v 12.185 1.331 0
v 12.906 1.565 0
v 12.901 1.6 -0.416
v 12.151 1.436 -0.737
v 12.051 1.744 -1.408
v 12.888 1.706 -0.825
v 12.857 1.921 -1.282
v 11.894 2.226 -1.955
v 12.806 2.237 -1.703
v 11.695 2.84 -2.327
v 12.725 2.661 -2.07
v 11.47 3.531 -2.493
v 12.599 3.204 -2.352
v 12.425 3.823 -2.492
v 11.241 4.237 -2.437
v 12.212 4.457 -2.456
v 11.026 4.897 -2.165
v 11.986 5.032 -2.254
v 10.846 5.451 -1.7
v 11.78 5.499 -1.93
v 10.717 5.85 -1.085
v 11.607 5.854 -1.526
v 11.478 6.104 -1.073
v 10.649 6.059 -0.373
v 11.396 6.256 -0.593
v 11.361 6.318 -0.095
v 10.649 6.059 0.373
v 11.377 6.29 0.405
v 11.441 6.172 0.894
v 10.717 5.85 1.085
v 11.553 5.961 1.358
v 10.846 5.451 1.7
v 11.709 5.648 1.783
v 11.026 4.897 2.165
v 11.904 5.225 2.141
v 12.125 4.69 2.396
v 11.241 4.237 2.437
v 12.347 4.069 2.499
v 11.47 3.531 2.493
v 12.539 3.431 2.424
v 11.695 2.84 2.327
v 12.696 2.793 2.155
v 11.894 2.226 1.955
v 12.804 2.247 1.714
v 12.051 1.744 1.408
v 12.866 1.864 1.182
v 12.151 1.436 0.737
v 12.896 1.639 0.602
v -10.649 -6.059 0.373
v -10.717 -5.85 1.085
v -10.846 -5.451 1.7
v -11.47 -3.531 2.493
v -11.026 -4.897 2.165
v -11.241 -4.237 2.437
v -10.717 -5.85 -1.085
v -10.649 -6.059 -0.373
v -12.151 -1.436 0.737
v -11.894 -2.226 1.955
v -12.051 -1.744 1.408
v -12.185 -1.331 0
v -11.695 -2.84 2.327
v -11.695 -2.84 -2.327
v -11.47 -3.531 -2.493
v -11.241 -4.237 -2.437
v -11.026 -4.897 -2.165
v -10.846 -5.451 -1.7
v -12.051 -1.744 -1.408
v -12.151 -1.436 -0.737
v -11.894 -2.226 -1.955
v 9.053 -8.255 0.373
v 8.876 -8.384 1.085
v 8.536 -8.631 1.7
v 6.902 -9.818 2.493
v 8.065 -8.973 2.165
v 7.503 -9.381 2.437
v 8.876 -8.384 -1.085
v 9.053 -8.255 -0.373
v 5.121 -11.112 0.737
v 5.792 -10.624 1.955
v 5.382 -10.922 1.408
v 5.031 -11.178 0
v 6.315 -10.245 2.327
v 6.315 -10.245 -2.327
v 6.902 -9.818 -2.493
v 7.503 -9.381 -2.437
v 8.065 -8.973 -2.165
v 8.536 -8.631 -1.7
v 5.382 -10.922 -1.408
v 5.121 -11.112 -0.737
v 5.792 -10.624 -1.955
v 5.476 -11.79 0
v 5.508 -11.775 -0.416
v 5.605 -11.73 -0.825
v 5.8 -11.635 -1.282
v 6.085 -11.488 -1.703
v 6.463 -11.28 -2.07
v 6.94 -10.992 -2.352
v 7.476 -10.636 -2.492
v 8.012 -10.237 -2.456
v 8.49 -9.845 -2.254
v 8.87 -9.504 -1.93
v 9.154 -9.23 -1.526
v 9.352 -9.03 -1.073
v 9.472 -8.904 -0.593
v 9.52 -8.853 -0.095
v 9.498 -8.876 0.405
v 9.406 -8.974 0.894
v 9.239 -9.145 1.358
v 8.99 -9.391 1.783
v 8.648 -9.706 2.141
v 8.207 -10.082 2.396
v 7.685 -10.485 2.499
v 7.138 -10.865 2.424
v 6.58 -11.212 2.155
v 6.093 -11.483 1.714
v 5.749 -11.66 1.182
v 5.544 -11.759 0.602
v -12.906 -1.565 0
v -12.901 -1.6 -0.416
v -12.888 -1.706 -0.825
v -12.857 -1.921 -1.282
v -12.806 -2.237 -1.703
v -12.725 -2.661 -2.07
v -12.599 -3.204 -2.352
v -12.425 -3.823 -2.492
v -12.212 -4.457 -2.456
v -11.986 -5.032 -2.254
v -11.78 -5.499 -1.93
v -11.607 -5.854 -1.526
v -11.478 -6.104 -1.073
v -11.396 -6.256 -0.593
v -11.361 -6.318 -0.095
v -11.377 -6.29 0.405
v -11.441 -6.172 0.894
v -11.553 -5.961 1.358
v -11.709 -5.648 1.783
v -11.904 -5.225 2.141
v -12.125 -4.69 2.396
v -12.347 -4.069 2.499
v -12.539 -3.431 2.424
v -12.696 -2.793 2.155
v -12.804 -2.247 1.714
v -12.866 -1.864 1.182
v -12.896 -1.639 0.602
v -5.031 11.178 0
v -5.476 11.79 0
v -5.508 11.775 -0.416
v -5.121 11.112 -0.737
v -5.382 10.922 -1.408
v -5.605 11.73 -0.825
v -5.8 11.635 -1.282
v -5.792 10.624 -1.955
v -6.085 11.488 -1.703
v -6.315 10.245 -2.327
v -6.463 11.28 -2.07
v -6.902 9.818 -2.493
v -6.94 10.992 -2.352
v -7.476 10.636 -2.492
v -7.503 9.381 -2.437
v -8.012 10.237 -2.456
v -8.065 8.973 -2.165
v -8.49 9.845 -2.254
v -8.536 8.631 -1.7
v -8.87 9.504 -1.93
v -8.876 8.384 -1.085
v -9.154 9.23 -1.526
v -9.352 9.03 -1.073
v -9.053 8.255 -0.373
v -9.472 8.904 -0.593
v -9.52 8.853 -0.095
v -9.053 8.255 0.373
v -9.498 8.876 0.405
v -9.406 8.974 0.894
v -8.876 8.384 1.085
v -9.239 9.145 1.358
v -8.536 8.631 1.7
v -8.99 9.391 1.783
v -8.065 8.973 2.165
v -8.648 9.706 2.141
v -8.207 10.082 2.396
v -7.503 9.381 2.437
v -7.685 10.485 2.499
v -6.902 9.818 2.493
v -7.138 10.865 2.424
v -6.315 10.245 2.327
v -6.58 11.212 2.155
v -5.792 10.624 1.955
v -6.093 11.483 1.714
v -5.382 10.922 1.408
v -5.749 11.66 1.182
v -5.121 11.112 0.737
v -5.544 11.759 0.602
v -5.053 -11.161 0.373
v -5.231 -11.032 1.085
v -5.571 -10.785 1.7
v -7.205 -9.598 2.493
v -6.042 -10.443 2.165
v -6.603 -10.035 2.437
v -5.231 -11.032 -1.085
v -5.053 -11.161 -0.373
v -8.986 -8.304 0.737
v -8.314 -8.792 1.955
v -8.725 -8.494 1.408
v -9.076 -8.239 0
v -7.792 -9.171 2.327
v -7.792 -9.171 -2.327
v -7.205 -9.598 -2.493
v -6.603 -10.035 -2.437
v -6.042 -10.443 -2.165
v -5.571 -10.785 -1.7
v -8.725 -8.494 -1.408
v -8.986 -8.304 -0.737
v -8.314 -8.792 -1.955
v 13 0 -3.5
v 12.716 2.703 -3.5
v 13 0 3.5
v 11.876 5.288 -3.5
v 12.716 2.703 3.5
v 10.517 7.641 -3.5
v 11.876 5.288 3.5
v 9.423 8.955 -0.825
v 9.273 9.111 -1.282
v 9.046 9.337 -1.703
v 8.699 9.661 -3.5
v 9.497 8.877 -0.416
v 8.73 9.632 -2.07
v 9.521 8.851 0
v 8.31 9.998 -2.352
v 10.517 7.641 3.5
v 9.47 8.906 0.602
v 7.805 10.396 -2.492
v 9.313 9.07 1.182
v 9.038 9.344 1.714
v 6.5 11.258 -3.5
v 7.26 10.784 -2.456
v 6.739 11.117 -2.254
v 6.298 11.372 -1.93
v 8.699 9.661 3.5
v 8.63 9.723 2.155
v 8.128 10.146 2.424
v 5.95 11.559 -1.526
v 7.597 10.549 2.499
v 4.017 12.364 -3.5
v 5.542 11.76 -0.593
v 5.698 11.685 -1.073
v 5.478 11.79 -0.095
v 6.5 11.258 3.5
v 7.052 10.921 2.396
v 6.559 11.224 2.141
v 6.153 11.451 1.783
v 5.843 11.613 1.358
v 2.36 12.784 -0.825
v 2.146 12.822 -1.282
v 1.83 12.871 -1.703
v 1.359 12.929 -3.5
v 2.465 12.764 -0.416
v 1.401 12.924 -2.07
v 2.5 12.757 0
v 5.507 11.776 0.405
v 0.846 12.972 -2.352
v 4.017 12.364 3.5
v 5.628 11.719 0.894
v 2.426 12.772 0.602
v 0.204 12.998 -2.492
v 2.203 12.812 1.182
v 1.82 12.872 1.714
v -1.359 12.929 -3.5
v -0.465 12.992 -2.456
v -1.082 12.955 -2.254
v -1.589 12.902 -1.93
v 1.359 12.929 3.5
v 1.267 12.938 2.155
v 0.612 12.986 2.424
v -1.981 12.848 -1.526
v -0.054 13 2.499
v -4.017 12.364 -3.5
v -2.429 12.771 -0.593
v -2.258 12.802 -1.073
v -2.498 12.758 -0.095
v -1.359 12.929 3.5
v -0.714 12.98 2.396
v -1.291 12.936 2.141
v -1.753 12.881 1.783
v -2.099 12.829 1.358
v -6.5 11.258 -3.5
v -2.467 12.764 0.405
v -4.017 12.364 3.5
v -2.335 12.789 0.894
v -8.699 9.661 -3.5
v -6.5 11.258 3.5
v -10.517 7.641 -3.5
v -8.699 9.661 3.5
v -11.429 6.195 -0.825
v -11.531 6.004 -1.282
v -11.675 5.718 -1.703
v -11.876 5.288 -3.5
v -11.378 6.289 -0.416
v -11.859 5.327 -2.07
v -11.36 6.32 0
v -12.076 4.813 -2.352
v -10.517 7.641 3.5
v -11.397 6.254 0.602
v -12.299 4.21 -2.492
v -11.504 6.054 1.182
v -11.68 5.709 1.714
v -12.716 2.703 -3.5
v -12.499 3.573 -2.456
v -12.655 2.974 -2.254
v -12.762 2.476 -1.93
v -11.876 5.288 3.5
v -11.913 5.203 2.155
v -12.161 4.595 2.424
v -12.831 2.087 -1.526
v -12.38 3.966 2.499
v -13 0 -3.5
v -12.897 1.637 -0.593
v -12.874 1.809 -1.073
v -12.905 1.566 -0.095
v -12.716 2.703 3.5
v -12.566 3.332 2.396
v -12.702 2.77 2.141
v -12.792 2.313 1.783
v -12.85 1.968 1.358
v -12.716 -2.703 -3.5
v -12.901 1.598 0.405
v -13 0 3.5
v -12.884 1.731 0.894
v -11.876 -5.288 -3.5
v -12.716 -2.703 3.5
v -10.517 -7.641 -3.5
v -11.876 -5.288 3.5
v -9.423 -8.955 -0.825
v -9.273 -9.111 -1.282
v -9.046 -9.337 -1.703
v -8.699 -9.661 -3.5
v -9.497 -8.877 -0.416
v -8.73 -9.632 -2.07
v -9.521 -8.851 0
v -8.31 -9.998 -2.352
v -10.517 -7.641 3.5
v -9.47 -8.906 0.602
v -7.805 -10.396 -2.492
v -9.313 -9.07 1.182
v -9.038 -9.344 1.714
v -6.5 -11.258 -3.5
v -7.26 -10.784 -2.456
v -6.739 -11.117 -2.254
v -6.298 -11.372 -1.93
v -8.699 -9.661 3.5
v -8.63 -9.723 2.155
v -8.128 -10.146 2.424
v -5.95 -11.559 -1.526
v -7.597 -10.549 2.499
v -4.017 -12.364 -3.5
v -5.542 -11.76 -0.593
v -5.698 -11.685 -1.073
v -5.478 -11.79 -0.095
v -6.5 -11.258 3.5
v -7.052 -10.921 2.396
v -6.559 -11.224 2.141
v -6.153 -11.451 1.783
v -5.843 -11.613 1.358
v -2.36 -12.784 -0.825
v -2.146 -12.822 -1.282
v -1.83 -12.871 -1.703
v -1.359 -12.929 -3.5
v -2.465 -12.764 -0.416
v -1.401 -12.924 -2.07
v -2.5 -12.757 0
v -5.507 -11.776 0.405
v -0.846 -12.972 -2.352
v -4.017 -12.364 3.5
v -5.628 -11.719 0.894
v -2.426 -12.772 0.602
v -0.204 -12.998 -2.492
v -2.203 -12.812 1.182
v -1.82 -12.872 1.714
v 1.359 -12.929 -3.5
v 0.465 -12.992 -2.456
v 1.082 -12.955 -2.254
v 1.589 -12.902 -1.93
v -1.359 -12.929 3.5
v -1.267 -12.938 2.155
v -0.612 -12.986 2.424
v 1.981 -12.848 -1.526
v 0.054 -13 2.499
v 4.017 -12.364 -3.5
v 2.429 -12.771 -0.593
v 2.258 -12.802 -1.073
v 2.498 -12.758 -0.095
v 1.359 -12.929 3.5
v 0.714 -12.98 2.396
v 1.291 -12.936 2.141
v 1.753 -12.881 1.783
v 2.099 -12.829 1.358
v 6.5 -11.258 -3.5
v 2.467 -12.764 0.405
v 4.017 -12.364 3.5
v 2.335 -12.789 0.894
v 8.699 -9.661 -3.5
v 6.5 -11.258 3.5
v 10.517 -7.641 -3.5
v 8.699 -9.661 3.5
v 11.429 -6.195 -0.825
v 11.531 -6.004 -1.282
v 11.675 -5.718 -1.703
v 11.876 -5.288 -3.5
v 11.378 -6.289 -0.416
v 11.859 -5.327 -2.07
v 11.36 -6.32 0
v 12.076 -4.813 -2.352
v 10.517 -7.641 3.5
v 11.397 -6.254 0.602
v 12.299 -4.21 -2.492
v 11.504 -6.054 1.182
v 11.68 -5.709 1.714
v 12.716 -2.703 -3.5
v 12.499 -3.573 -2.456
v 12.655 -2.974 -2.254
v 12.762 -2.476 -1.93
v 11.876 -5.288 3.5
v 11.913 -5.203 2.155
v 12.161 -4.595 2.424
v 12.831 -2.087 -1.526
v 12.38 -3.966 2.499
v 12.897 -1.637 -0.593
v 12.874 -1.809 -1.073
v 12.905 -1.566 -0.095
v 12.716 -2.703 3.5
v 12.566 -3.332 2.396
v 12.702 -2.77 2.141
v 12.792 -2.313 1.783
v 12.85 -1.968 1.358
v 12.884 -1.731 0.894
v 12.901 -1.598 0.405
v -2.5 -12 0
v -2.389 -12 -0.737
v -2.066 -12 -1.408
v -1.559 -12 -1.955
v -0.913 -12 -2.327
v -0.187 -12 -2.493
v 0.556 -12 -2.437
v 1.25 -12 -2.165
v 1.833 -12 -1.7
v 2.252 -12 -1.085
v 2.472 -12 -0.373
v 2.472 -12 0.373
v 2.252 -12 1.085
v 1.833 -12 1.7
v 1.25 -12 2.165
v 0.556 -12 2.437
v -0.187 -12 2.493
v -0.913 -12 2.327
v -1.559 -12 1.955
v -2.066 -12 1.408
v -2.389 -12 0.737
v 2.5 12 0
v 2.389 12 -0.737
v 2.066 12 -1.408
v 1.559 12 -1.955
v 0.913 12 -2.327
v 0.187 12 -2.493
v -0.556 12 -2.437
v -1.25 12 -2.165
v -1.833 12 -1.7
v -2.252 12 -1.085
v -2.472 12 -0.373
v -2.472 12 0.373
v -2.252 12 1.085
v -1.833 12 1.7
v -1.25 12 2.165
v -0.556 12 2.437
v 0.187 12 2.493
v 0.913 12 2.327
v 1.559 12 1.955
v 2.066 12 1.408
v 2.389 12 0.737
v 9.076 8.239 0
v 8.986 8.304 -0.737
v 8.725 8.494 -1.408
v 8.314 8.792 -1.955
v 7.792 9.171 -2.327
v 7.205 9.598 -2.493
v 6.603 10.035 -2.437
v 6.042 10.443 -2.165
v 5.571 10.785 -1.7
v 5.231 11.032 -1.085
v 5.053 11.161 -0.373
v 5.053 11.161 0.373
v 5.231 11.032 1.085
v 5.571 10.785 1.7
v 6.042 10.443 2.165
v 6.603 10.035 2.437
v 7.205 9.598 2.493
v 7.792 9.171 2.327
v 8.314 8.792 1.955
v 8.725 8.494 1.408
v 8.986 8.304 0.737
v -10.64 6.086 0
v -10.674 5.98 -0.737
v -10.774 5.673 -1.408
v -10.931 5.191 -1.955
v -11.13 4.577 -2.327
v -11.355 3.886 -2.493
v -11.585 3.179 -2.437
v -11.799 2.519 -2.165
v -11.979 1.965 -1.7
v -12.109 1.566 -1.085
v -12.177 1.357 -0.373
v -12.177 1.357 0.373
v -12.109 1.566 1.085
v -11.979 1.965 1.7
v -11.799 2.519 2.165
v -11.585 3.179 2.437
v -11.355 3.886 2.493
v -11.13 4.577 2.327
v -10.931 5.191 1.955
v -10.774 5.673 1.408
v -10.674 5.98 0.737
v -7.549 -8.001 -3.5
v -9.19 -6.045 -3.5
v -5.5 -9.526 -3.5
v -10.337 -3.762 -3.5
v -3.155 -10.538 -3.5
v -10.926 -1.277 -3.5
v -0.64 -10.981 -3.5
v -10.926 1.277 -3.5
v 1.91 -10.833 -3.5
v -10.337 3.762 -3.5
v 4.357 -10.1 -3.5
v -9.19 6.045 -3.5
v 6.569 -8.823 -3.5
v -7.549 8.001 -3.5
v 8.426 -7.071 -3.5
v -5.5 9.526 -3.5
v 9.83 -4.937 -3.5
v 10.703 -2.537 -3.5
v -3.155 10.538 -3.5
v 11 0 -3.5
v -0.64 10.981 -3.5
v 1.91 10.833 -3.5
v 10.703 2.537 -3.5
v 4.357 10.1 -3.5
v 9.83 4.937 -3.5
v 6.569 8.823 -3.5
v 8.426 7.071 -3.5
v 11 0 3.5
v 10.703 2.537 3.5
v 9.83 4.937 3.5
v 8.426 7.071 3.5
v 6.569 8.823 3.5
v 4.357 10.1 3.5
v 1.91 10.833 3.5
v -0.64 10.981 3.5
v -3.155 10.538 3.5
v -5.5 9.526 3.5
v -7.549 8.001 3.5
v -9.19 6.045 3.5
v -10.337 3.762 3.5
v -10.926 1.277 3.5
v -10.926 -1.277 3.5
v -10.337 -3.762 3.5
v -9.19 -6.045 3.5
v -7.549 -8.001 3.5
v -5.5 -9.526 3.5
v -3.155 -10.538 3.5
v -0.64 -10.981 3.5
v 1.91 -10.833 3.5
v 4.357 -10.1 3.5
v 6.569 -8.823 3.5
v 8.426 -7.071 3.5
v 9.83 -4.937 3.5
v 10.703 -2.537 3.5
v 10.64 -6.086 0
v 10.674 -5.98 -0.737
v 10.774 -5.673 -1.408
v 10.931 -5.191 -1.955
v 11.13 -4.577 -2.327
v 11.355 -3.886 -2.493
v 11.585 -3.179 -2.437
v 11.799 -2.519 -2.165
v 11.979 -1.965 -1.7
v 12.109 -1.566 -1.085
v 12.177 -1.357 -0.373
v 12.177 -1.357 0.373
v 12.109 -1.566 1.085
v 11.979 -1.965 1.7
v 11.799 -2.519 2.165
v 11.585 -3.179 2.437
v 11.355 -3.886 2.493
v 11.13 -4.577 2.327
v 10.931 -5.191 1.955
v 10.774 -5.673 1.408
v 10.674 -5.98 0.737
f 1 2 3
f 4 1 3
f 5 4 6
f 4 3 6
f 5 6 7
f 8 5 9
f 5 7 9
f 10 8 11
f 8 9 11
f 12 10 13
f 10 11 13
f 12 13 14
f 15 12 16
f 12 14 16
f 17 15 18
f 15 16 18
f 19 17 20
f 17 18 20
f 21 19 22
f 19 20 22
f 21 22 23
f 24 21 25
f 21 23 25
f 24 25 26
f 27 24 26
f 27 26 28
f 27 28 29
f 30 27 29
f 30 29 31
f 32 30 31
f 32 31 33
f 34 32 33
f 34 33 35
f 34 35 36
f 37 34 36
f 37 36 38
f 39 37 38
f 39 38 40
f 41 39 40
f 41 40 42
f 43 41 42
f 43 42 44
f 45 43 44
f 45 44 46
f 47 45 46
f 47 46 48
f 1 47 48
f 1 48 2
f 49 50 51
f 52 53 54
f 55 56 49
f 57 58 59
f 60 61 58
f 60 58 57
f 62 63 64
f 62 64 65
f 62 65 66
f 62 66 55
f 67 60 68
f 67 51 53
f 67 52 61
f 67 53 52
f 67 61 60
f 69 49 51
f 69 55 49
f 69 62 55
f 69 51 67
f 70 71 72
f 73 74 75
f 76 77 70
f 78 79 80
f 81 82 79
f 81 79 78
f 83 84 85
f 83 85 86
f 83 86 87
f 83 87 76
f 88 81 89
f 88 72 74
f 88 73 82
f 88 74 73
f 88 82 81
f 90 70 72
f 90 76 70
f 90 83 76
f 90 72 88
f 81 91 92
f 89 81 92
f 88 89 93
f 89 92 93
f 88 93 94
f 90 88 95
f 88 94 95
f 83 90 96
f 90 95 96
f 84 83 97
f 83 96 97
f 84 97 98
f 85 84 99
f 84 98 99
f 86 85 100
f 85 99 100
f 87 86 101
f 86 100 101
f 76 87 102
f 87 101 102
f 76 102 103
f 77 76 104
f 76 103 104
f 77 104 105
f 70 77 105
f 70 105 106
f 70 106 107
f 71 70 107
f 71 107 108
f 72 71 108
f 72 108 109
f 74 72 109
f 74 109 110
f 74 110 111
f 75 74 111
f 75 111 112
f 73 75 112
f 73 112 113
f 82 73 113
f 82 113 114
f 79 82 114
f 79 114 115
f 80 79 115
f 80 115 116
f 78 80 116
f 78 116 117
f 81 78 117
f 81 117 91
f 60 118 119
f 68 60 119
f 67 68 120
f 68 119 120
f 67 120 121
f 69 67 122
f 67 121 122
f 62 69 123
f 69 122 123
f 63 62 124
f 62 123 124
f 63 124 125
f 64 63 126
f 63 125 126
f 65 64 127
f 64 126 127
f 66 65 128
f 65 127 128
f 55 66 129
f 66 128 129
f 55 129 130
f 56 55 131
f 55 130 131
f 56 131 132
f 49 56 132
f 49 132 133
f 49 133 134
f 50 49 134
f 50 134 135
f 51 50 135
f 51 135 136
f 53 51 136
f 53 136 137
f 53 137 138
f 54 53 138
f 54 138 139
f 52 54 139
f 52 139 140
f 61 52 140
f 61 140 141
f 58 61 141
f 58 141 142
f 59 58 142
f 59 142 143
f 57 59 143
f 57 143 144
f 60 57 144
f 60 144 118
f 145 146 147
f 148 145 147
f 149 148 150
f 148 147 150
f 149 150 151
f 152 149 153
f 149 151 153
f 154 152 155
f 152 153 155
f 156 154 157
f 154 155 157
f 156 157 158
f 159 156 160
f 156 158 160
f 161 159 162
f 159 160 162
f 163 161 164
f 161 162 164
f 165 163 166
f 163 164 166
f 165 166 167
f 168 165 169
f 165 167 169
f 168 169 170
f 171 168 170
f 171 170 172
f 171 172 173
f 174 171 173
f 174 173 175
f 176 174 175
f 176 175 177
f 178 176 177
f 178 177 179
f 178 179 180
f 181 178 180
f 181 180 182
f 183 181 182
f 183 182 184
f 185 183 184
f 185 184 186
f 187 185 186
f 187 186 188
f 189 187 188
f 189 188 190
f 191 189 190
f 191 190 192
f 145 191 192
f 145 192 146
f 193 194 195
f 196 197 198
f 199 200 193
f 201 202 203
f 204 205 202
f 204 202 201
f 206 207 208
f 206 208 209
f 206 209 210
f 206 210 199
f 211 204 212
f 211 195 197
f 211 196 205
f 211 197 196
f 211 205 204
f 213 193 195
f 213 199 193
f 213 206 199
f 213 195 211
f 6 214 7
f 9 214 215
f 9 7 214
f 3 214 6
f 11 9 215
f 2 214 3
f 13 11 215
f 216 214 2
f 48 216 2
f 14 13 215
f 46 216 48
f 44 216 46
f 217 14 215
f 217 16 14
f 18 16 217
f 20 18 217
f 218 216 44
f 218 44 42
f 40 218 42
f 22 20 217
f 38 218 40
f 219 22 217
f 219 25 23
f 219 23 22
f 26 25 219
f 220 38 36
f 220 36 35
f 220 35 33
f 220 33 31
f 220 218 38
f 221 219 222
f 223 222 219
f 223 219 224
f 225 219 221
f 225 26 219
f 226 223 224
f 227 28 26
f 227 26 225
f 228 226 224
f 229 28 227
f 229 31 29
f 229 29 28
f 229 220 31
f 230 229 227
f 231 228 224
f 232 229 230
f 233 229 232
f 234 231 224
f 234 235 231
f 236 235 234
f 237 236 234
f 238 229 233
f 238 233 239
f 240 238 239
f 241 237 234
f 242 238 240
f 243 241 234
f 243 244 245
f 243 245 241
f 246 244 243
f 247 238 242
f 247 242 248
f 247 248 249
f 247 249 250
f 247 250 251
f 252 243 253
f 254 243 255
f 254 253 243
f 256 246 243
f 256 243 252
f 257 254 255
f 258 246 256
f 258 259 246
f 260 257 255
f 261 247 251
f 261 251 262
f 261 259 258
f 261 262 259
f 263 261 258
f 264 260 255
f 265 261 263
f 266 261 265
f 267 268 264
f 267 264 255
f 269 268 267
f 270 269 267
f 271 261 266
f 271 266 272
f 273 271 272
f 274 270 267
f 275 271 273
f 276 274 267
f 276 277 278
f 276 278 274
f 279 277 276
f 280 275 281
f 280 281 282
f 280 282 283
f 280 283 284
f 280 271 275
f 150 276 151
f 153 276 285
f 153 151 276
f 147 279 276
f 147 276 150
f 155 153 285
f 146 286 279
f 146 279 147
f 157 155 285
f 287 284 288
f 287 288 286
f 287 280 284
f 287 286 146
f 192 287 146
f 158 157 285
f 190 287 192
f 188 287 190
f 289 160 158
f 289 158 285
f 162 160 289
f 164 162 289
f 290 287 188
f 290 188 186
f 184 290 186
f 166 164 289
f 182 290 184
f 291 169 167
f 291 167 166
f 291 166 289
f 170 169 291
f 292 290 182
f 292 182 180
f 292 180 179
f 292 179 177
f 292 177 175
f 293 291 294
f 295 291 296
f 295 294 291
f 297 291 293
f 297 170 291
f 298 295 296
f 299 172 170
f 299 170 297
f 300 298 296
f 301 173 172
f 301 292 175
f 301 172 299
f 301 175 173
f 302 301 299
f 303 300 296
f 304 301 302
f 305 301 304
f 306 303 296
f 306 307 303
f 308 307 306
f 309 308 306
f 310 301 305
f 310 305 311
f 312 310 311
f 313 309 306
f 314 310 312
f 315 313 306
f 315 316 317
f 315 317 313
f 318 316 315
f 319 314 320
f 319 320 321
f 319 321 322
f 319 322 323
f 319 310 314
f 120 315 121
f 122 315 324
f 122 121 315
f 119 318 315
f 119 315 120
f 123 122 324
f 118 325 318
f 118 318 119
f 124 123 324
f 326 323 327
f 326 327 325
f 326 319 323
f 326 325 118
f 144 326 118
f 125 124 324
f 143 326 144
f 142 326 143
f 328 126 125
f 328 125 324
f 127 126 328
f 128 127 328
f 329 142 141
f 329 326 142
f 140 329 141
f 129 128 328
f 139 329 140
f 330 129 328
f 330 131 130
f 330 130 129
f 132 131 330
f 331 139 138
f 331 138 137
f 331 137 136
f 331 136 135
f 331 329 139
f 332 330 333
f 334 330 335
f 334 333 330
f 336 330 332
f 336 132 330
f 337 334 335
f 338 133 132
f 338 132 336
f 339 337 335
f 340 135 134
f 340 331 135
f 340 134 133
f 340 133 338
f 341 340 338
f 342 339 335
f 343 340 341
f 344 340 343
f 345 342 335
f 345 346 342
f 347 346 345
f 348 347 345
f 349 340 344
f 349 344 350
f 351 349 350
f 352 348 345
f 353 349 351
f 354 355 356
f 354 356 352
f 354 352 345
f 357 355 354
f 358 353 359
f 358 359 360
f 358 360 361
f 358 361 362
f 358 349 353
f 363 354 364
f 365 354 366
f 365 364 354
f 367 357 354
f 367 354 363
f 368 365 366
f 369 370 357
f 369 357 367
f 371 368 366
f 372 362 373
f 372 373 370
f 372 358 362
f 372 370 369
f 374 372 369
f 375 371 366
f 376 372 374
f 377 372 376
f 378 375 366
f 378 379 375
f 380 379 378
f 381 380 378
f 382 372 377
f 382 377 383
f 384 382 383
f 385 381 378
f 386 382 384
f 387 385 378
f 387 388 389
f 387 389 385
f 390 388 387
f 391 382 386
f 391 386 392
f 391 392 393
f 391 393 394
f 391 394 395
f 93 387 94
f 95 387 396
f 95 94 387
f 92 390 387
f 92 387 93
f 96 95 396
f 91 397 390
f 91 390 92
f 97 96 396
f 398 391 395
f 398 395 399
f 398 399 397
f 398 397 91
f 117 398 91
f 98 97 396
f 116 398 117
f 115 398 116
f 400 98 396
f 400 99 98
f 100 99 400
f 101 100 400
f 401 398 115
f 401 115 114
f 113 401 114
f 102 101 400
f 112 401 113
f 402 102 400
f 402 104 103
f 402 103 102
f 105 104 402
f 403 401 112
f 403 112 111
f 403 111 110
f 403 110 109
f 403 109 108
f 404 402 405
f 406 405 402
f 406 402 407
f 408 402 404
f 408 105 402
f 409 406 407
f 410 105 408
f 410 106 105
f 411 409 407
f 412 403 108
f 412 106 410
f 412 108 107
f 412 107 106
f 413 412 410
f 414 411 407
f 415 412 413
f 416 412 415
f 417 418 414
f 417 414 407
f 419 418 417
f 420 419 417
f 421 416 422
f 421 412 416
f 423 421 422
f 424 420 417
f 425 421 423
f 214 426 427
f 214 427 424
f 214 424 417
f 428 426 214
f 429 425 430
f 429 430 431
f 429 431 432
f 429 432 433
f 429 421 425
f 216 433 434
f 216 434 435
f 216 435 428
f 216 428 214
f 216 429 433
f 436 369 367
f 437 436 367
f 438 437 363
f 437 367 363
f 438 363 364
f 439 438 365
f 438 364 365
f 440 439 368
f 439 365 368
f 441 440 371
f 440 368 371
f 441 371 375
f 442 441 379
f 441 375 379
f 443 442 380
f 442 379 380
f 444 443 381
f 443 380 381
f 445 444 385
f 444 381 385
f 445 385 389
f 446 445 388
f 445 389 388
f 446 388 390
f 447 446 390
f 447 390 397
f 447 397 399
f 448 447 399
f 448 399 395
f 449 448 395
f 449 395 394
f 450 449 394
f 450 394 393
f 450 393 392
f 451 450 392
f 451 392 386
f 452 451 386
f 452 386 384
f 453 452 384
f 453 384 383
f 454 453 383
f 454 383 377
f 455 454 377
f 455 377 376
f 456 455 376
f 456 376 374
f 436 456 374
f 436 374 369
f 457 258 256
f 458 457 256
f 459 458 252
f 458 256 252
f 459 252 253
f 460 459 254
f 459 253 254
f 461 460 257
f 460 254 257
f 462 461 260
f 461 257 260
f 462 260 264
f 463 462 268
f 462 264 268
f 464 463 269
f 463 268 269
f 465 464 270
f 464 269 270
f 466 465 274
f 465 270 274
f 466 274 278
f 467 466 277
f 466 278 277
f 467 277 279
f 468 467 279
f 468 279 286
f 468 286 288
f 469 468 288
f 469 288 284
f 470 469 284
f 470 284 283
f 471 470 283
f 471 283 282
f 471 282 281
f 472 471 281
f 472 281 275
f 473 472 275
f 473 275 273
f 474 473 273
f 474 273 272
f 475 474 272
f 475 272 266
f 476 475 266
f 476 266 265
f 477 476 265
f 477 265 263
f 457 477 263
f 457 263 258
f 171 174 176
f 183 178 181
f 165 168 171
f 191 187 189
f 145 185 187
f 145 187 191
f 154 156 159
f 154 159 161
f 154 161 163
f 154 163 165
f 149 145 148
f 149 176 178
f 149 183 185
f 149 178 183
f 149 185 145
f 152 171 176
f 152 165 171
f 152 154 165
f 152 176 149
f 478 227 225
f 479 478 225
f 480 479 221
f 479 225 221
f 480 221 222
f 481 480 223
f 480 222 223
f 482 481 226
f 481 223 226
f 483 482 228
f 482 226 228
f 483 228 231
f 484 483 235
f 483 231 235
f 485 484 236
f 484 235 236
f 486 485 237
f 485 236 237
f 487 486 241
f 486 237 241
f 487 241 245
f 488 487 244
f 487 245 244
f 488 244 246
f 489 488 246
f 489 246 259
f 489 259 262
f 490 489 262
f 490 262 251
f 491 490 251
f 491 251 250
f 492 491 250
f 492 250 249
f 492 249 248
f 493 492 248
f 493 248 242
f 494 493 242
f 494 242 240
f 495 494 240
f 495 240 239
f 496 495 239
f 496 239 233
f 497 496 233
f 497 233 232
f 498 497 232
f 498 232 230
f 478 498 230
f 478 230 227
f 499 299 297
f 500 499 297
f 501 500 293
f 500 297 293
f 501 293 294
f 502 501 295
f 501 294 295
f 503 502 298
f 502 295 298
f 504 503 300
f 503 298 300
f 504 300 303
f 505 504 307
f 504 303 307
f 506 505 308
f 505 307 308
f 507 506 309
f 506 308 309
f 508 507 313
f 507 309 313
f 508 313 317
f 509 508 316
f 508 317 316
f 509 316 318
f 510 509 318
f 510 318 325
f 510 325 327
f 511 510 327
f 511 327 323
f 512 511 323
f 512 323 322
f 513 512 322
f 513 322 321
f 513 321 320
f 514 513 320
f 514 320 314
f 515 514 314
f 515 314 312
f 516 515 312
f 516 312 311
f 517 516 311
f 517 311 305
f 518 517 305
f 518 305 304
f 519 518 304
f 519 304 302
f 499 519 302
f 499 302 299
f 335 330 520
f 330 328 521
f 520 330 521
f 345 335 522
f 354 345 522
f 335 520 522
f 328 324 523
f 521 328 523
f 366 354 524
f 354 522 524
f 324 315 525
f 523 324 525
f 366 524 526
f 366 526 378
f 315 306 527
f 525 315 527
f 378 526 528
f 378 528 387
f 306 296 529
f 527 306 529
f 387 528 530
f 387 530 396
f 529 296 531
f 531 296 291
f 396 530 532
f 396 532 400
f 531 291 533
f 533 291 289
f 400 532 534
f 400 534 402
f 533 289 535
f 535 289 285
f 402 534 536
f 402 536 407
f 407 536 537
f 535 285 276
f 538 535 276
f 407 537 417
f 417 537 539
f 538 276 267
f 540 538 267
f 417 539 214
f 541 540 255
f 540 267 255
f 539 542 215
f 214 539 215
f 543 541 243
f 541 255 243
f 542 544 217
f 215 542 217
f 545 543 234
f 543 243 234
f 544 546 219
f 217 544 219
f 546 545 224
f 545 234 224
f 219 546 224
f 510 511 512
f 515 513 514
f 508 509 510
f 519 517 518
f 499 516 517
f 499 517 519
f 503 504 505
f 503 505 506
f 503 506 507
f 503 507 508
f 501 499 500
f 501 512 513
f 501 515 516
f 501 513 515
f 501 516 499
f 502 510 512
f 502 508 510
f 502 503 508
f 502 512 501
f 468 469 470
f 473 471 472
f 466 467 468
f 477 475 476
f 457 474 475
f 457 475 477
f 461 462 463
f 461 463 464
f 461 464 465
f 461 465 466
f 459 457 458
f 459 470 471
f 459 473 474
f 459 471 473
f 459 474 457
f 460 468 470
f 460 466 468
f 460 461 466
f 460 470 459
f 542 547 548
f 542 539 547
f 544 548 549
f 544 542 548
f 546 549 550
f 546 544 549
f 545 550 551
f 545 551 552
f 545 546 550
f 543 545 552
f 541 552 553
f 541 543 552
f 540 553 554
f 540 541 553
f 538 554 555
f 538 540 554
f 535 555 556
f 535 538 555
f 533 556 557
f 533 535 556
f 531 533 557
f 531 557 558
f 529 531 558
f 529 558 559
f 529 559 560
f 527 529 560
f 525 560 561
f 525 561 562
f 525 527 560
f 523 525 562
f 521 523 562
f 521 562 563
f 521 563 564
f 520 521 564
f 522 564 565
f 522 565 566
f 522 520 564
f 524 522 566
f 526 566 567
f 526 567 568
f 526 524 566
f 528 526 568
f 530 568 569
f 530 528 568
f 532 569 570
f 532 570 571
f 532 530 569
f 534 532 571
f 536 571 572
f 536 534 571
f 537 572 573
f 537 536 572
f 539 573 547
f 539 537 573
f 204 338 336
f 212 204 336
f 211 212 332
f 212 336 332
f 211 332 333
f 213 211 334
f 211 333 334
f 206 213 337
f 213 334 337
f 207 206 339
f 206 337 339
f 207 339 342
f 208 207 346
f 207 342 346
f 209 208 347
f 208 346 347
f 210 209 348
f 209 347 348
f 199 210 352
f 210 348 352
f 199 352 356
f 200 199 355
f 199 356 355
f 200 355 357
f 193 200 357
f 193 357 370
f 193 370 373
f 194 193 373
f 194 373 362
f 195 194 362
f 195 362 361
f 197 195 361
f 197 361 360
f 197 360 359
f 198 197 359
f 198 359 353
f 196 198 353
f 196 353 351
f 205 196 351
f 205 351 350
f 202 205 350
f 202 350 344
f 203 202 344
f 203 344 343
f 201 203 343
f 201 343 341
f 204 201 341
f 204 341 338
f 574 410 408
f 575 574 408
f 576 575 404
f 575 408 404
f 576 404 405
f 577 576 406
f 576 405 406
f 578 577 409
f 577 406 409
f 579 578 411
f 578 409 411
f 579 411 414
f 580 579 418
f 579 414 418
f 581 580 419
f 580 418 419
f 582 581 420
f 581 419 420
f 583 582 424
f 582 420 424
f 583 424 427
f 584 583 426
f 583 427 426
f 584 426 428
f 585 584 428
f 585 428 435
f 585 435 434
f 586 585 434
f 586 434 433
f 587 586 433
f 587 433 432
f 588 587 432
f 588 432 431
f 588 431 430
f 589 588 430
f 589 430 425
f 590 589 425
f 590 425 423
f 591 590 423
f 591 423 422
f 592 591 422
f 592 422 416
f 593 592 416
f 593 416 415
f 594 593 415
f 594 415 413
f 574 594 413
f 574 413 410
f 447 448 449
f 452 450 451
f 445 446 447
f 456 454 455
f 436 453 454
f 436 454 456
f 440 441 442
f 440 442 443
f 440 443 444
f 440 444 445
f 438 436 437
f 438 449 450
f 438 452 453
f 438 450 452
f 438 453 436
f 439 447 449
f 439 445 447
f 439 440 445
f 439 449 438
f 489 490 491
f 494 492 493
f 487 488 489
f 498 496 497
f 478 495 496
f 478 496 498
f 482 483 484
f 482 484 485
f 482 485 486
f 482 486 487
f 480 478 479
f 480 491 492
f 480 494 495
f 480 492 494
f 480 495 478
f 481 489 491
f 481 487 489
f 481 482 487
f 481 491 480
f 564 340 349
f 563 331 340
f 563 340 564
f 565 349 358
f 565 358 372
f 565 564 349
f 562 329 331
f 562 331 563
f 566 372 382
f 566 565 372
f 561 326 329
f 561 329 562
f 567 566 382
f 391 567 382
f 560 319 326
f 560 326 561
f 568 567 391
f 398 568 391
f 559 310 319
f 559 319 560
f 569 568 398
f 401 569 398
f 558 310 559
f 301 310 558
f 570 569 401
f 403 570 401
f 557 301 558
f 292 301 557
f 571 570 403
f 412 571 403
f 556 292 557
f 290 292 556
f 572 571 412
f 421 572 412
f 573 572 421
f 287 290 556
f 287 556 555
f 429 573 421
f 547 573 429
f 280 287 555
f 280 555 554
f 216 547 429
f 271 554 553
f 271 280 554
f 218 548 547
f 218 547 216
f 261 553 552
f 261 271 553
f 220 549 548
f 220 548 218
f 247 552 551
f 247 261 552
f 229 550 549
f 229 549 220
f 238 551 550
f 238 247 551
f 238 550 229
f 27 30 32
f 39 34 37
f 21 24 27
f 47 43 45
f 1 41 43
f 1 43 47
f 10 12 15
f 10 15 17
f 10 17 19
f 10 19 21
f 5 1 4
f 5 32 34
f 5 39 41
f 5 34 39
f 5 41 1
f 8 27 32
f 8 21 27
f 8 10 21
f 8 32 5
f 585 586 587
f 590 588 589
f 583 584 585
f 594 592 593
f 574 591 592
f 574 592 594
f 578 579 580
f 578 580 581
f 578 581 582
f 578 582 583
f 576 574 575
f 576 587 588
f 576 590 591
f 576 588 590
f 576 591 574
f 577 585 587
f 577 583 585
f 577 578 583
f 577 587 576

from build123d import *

# Parameters (mm, degrees)
SKETCH1_R           = 13
SKETCH1_R_2         = 11
BOSS_EXTRUDE1_DEPTH = 3.5
SKETCH2_R           = 2.5
CUT_EXTRUDE3_DEPTH  = 1
CIRPATTERN1_COUNT   = 10


with BuildPart() as part:
    # Sketch1 → Boss-Extrude1 (new, symmetric)
    with BuildSketch(Plane.XY):
        Circle(SKETCH1_R)
        Circle(SKETCH1_R_2, mode=Mode.SUBTRACT)
    extrude(amount=BOSS_EXTRUDE1_DEPTH, both=True)

    # Sketch2 → Cut-Extrude3 (cut)
    with BuildSketch(Plane(origin=(0, 13, 0), x_dir=(1, 0, 0), z_dir=(0, 1, 0))):
        Circle(SKETCH2_R)
    cut_extrude3 = extrude(amount=-CUT_EXTRUDE3_DEPTH, mode=Mode.SUBTRACT)

    # CirPattern1: Cut-Extrude3 ×10 about axis
    cirpattern1_axis = Axis((0, 0, 3.5), (0, 0, -1))
    for i in range(1, CIRPATTERN1_COUNT):
        add(cut_extrude3.rotate(cirpattern1_axis, i * 360 / CIRPATTERN1_COUNT), mode=Mode.SUBTRACT)


solid = part.part
